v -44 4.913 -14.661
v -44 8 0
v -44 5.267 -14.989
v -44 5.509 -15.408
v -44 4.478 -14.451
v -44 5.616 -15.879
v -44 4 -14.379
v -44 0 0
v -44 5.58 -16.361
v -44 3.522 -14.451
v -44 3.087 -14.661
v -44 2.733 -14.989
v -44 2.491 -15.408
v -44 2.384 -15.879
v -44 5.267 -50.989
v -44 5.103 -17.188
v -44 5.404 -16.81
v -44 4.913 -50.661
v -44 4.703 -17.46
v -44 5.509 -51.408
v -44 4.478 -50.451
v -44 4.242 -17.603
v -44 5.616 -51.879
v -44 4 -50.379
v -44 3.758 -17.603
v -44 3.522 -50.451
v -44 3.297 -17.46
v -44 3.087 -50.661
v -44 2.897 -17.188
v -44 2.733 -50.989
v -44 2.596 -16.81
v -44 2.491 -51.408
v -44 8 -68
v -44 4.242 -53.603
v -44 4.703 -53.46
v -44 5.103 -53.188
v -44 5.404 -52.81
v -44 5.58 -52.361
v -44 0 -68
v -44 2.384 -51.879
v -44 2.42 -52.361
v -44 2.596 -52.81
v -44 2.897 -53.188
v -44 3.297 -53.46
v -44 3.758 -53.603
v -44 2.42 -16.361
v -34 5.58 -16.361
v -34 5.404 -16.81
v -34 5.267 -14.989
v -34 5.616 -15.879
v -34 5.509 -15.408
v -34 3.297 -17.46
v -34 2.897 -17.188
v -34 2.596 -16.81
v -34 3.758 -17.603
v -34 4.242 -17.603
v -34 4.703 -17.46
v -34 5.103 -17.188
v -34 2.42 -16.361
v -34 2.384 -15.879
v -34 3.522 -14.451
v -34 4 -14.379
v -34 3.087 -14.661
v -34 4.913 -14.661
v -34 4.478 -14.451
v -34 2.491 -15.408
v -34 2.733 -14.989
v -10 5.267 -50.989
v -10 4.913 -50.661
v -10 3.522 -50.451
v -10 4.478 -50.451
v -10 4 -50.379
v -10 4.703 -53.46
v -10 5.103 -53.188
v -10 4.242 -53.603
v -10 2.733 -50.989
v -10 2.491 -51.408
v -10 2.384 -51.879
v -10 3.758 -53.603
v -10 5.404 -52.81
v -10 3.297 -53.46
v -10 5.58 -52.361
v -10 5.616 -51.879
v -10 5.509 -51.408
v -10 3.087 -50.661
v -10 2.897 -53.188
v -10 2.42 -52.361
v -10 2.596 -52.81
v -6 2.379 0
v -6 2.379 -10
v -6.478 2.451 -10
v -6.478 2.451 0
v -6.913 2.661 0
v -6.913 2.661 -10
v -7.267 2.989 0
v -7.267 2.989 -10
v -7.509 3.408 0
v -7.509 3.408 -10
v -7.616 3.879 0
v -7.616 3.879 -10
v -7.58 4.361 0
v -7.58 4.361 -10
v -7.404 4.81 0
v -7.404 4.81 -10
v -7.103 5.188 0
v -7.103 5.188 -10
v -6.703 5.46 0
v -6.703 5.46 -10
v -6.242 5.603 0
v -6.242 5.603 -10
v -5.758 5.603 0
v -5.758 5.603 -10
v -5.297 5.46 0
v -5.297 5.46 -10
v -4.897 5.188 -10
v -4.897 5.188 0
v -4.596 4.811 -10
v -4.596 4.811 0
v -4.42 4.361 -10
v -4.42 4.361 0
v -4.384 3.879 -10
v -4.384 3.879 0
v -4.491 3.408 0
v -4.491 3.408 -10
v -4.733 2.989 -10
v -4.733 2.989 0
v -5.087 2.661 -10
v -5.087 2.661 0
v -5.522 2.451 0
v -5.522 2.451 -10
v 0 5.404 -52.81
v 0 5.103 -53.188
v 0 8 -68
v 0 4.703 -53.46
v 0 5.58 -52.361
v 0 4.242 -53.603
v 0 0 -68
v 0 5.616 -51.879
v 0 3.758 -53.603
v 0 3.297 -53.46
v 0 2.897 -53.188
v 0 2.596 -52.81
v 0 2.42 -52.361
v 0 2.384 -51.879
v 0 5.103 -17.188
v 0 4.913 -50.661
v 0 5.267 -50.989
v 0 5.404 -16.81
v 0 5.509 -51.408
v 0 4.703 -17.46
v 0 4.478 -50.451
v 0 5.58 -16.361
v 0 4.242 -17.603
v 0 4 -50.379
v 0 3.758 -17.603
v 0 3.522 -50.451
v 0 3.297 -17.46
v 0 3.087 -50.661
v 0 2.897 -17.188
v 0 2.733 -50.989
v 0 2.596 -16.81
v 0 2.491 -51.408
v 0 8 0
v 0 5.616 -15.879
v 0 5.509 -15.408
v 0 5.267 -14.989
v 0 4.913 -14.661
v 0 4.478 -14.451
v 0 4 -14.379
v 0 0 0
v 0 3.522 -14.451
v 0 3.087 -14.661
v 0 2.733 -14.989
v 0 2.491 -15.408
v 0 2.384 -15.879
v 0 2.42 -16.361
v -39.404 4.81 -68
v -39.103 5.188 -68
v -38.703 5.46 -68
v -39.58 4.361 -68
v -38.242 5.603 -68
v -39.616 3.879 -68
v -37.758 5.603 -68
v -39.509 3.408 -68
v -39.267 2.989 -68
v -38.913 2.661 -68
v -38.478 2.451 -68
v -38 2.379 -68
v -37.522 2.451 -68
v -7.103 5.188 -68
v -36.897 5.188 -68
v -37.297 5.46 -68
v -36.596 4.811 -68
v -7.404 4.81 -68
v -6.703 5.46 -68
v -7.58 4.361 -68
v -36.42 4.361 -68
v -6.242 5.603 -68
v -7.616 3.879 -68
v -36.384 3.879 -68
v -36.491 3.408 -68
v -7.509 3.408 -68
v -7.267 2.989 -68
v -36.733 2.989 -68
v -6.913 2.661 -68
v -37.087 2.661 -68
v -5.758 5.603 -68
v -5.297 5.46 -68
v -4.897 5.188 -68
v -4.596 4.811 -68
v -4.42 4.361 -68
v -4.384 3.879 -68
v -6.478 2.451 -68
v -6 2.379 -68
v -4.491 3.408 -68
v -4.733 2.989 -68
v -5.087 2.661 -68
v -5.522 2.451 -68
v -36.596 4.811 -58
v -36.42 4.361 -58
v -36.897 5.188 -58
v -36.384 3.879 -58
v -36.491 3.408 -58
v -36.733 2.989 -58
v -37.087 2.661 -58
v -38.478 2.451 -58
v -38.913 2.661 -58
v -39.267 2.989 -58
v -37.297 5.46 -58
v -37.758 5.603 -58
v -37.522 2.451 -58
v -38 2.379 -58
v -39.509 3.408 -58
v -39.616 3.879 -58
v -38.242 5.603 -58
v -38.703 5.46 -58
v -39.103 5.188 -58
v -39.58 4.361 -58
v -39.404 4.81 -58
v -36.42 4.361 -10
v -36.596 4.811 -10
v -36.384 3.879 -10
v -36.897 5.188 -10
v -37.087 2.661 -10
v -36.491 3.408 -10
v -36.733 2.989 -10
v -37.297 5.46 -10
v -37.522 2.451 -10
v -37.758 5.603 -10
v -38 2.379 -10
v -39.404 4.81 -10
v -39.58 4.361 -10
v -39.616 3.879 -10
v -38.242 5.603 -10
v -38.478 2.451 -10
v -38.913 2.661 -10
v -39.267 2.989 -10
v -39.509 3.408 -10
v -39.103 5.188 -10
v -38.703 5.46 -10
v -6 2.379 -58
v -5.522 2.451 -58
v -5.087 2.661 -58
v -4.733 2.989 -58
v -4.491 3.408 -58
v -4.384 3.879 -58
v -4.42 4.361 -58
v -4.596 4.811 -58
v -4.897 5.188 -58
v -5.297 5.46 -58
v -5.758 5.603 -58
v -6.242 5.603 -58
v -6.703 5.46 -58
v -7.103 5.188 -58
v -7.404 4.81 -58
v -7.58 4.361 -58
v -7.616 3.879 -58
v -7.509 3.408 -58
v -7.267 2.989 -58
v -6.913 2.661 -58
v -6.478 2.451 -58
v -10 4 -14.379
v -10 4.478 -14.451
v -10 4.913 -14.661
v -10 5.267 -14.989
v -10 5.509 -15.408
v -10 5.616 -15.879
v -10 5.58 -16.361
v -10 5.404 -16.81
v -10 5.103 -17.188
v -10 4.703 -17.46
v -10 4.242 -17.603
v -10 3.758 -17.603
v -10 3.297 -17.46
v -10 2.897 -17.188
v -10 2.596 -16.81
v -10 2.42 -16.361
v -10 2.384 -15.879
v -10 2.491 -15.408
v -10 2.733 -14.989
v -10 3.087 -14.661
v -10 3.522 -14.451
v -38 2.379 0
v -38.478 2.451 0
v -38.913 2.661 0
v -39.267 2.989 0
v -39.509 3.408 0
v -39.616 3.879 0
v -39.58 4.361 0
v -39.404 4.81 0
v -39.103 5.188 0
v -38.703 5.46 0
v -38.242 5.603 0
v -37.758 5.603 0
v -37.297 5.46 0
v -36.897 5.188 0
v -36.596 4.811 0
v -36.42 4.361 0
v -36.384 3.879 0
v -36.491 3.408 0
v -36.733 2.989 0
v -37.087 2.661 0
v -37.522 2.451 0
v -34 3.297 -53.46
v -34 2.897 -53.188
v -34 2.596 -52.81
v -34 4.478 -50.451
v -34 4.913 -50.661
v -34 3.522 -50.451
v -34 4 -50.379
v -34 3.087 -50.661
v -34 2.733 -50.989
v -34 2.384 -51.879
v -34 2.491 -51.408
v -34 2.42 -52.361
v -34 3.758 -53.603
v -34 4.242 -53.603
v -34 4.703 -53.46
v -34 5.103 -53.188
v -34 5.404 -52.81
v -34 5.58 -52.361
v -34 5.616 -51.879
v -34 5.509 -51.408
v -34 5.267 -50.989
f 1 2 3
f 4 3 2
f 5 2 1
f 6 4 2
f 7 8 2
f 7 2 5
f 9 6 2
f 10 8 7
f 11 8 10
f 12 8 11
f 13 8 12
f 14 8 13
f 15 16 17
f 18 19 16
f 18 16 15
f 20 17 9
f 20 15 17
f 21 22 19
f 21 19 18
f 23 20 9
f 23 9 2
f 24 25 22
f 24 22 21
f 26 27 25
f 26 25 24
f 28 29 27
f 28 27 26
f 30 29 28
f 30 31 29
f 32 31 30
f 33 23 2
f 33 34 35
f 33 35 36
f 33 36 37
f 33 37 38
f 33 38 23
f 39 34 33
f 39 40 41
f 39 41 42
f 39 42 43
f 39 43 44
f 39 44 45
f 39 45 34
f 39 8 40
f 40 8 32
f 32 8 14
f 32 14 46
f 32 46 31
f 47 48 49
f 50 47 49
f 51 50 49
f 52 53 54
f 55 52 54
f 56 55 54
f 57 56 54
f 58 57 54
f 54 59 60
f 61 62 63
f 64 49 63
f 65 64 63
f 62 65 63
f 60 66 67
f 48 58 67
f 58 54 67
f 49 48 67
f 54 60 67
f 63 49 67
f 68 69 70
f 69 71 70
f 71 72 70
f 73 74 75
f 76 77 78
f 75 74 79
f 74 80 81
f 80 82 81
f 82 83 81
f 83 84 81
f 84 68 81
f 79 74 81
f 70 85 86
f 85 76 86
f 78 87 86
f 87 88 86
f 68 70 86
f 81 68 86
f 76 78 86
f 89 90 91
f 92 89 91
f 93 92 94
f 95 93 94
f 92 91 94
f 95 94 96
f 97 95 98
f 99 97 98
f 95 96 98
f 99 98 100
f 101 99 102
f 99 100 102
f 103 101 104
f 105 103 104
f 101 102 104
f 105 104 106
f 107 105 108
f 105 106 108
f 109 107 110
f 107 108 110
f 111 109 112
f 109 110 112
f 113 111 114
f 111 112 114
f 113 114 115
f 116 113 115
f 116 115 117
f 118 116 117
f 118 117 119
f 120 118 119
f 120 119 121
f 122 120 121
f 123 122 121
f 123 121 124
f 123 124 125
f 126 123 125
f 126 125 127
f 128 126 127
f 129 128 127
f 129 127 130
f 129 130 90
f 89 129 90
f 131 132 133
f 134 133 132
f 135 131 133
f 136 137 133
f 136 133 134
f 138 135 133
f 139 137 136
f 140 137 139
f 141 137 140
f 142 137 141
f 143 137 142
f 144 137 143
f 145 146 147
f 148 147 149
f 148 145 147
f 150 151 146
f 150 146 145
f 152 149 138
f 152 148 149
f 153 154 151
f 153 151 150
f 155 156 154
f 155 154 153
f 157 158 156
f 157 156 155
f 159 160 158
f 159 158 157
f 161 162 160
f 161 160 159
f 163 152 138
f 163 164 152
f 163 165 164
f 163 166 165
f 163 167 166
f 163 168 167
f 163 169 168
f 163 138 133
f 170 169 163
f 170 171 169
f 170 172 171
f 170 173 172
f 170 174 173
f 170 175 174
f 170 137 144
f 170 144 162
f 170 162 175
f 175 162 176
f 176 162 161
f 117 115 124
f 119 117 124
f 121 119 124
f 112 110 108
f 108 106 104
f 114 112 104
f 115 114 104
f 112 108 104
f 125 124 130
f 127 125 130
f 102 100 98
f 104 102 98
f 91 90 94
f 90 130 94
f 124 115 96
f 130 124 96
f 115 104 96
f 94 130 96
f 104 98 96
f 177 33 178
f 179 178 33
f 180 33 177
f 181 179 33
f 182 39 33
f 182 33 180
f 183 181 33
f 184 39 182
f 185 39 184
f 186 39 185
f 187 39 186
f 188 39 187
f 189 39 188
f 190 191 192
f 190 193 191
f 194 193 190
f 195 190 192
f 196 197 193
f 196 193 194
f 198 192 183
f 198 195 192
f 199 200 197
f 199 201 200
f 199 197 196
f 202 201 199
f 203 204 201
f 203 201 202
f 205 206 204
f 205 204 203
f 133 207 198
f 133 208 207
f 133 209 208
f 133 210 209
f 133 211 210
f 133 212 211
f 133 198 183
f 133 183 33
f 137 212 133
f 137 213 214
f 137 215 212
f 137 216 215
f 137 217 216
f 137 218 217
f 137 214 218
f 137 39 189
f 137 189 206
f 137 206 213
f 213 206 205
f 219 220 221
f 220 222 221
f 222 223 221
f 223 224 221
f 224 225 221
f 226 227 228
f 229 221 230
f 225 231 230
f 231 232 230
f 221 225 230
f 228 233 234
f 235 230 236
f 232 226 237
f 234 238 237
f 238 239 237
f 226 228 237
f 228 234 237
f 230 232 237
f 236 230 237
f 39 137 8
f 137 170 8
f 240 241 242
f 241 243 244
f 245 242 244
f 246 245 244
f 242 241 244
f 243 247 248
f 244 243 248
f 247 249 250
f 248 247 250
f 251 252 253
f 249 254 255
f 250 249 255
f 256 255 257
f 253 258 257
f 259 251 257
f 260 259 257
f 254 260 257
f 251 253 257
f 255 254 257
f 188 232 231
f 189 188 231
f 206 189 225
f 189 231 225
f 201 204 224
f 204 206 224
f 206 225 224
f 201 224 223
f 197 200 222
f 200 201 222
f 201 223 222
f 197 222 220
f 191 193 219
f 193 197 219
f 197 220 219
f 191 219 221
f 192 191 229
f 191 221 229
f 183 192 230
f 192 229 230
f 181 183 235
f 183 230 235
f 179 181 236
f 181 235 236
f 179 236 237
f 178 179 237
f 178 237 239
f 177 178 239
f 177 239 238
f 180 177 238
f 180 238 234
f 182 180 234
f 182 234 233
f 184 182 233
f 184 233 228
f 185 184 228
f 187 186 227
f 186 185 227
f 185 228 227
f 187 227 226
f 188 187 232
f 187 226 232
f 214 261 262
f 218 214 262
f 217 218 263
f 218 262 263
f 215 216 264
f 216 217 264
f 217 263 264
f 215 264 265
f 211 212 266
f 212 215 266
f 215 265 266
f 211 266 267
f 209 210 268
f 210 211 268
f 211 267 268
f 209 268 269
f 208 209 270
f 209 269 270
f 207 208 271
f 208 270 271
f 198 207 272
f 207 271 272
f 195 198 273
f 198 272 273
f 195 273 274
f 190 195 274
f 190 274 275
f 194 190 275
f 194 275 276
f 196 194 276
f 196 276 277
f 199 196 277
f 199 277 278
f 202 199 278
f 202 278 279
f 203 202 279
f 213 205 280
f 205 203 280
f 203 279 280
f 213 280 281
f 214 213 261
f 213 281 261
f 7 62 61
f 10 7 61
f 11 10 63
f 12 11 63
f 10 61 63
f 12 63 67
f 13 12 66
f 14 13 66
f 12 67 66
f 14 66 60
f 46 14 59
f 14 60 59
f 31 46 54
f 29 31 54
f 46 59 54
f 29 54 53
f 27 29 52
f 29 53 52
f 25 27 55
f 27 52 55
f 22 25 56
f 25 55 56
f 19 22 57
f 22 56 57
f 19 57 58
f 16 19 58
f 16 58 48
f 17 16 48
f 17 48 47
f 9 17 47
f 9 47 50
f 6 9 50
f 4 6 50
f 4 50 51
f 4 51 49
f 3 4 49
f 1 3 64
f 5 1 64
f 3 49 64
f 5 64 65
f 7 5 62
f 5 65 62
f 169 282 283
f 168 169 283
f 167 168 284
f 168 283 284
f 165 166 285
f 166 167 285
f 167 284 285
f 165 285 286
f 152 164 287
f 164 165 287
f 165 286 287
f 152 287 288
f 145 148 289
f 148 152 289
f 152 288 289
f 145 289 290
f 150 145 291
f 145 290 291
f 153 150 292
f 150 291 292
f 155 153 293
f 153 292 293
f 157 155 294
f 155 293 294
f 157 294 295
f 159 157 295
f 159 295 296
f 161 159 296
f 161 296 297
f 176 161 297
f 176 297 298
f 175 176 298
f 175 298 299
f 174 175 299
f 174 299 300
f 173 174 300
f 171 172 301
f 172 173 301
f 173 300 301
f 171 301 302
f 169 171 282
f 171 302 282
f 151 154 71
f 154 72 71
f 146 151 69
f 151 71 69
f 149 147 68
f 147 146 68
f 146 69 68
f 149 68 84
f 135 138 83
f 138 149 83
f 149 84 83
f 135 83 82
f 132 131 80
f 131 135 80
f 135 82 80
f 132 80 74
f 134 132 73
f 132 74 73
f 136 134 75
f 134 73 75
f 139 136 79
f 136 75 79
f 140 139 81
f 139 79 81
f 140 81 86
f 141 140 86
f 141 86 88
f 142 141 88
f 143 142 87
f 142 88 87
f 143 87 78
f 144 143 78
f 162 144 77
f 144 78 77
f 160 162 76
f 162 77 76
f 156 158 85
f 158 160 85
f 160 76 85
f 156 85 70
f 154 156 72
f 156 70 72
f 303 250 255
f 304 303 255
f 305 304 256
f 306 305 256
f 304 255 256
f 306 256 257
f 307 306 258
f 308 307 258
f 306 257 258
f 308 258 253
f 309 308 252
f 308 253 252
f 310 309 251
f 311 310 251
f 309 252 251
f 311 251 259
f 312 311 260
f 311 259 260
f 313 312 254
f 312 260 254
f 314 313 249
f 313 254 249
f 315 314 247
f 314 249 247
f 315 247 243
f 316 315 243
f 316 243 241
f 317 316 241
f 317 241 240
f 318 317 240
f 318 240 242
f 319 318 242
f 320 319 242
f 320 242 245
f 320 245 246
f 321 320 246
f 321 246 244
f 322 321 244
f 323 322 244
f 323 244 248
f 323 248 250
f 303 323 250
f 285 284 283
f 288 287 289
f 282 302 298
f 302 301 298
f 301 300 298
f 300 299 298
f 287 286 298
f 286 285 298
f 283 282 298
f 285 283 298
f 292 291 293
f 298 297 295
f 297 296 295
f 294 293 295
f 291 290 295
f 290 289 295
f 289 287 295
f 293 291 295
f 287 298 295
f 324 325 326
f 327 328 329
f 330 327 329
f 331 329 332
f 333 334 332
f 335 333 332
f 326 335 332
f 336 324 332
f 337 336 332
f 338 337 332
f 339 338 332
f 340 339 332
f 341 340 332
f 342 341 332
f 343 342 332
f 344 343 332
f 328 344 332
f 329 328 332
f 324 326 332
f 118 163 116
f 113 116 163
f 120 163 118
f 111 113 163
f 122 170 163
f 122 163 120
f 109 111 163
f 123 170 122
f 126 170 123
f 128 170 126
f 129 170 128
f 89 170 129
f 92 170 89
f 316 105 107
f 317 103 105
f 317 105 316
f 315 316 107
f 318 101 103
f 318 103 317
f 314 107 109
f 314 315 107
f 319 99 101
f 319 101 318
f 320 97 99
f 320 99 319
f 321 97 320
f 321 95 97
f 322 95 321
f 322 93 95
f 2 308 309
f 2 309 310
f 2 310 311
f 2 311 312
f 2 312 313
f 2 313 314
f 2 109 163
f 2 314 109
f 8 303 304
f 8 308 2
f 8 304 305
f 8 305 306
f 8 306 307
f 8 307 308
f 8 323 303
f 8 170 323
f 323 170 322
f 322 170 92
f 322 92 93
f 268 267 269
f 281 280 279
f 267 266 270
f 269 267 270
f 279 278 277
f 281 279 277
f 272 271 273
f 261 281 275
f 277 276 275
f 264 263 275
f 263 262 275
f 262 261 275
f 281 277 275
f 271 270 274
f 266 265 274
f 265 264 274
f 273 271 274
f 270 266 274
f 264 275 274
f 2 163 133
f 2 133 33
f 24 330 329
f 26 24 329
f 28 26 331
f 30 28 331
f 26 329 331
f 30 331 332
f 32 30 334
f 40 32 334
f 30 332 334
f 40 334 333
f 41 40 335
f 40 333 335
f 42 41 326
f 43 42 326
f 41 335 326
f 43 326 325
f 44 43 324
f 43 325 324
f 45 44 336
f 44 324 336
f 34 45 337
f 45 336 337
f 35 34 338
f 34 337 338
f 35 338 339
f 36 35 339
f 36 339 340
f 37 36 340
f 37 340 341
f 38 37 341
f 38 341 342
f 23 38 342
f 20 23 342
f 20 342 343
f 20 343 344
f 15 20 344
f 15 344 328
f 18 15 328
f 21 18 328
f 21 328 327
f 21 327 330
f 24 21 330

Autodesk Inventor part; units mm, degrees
ref_plane "XZ Plane" through (0, 0, 0) normal (0, 1, 0) x (-1, 0, 0)
sketch "Skizze1" plane through (0, 0, 0) normal (0, 1, 0) x (-1, 0, 0)
  line L0 (0, 0) -> (44, 0)
  line L1 (44, 0) -> (44, -68)
  line L2 (44, -68) -> (0, -68)
  line L3 (0, -68) -> (0, 0)
  dimension "d0" = 44
  dimension "d1" = 68
extrude "Extrusion1" add sketch "Skizze1" along normal blind 8
sketch "Skizze2" plane through (-44, 0, 0) normal (0, 0, 1) x (1, 0, 0)
  line L0 (44, 0) -> (44, 8) projected
  point P0 (38, 4)
  point P1 (6, 4)
  point P2 (44, 4)
  dimension "d4" = 32
  dimension "d5" = 6
hole "Bohrung1" at (-6, 4, 0) at (-38, 4, 0) direction (0, 0, -1) diameter 3.242 depth 10 thread size "M4x0.7" class "6H" standard "ISO Metric profile"
ref_plane "Arbeitsebene1" through (0, 0, -34) normal (0, 0, 1) x (1, 0, 0)
mirror "Spiegeln1" about plane through (0, 0, -34) normal (0, 0, 1) of "Bohrung1"
sketch "Skizze3" plane through (-44, 0, -68) normal (-1, 0, 0) x (0, 0, 1)
  line L0 (68, 0) -> (68, 8) projected
  point P0 (52, 4)
  point P1 (16, 4)
  point P2 (68, 4)
  dimension "d21" = 16
  dimension "d22" = 36
hole "Bohrung2" at (-44, 4, -16) at (-44, 4, -52) direction (1, 0, 0) diameter 3.242 depth 10 thread size "M4x0.7" class "6H" standard "ISO Metric profile"
ref_plane "Arbeitsebene2" through (-22, 0, 0) normal (1, 0, 0) x (0, 1, 0)
mirror "Spiegeln2" about plane through (-22, 0, 0) normal (1, 0, 0) of "Bohrung2"
properties part number "1013"
